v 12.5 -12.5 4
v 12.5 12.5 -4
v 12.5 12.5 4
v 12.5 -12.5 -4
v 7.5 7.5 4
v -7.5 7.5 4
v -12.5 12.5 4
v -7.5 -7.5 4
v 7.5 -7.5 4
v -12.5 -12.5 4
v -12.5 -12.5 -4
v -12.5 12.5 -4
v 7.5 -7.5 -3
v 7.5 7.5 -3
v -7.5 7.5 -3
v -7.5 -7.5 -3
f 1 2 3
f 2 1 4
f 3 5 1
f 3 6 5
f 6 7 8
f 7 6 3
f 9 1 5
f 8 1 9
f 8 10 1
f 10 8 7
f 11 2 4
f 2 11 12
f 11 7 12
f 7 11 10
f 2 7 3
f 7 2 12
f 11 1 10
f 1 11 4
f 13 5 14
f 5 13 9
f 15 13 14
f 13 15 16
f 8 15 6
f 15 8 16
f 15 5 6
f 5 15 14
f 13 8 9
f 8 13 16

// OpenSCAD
difference(){
difference(){
cube([25,25,8],center=true);
translate([0,0,3])
{
    cube([15,15,12],center=true);
}
}
}
